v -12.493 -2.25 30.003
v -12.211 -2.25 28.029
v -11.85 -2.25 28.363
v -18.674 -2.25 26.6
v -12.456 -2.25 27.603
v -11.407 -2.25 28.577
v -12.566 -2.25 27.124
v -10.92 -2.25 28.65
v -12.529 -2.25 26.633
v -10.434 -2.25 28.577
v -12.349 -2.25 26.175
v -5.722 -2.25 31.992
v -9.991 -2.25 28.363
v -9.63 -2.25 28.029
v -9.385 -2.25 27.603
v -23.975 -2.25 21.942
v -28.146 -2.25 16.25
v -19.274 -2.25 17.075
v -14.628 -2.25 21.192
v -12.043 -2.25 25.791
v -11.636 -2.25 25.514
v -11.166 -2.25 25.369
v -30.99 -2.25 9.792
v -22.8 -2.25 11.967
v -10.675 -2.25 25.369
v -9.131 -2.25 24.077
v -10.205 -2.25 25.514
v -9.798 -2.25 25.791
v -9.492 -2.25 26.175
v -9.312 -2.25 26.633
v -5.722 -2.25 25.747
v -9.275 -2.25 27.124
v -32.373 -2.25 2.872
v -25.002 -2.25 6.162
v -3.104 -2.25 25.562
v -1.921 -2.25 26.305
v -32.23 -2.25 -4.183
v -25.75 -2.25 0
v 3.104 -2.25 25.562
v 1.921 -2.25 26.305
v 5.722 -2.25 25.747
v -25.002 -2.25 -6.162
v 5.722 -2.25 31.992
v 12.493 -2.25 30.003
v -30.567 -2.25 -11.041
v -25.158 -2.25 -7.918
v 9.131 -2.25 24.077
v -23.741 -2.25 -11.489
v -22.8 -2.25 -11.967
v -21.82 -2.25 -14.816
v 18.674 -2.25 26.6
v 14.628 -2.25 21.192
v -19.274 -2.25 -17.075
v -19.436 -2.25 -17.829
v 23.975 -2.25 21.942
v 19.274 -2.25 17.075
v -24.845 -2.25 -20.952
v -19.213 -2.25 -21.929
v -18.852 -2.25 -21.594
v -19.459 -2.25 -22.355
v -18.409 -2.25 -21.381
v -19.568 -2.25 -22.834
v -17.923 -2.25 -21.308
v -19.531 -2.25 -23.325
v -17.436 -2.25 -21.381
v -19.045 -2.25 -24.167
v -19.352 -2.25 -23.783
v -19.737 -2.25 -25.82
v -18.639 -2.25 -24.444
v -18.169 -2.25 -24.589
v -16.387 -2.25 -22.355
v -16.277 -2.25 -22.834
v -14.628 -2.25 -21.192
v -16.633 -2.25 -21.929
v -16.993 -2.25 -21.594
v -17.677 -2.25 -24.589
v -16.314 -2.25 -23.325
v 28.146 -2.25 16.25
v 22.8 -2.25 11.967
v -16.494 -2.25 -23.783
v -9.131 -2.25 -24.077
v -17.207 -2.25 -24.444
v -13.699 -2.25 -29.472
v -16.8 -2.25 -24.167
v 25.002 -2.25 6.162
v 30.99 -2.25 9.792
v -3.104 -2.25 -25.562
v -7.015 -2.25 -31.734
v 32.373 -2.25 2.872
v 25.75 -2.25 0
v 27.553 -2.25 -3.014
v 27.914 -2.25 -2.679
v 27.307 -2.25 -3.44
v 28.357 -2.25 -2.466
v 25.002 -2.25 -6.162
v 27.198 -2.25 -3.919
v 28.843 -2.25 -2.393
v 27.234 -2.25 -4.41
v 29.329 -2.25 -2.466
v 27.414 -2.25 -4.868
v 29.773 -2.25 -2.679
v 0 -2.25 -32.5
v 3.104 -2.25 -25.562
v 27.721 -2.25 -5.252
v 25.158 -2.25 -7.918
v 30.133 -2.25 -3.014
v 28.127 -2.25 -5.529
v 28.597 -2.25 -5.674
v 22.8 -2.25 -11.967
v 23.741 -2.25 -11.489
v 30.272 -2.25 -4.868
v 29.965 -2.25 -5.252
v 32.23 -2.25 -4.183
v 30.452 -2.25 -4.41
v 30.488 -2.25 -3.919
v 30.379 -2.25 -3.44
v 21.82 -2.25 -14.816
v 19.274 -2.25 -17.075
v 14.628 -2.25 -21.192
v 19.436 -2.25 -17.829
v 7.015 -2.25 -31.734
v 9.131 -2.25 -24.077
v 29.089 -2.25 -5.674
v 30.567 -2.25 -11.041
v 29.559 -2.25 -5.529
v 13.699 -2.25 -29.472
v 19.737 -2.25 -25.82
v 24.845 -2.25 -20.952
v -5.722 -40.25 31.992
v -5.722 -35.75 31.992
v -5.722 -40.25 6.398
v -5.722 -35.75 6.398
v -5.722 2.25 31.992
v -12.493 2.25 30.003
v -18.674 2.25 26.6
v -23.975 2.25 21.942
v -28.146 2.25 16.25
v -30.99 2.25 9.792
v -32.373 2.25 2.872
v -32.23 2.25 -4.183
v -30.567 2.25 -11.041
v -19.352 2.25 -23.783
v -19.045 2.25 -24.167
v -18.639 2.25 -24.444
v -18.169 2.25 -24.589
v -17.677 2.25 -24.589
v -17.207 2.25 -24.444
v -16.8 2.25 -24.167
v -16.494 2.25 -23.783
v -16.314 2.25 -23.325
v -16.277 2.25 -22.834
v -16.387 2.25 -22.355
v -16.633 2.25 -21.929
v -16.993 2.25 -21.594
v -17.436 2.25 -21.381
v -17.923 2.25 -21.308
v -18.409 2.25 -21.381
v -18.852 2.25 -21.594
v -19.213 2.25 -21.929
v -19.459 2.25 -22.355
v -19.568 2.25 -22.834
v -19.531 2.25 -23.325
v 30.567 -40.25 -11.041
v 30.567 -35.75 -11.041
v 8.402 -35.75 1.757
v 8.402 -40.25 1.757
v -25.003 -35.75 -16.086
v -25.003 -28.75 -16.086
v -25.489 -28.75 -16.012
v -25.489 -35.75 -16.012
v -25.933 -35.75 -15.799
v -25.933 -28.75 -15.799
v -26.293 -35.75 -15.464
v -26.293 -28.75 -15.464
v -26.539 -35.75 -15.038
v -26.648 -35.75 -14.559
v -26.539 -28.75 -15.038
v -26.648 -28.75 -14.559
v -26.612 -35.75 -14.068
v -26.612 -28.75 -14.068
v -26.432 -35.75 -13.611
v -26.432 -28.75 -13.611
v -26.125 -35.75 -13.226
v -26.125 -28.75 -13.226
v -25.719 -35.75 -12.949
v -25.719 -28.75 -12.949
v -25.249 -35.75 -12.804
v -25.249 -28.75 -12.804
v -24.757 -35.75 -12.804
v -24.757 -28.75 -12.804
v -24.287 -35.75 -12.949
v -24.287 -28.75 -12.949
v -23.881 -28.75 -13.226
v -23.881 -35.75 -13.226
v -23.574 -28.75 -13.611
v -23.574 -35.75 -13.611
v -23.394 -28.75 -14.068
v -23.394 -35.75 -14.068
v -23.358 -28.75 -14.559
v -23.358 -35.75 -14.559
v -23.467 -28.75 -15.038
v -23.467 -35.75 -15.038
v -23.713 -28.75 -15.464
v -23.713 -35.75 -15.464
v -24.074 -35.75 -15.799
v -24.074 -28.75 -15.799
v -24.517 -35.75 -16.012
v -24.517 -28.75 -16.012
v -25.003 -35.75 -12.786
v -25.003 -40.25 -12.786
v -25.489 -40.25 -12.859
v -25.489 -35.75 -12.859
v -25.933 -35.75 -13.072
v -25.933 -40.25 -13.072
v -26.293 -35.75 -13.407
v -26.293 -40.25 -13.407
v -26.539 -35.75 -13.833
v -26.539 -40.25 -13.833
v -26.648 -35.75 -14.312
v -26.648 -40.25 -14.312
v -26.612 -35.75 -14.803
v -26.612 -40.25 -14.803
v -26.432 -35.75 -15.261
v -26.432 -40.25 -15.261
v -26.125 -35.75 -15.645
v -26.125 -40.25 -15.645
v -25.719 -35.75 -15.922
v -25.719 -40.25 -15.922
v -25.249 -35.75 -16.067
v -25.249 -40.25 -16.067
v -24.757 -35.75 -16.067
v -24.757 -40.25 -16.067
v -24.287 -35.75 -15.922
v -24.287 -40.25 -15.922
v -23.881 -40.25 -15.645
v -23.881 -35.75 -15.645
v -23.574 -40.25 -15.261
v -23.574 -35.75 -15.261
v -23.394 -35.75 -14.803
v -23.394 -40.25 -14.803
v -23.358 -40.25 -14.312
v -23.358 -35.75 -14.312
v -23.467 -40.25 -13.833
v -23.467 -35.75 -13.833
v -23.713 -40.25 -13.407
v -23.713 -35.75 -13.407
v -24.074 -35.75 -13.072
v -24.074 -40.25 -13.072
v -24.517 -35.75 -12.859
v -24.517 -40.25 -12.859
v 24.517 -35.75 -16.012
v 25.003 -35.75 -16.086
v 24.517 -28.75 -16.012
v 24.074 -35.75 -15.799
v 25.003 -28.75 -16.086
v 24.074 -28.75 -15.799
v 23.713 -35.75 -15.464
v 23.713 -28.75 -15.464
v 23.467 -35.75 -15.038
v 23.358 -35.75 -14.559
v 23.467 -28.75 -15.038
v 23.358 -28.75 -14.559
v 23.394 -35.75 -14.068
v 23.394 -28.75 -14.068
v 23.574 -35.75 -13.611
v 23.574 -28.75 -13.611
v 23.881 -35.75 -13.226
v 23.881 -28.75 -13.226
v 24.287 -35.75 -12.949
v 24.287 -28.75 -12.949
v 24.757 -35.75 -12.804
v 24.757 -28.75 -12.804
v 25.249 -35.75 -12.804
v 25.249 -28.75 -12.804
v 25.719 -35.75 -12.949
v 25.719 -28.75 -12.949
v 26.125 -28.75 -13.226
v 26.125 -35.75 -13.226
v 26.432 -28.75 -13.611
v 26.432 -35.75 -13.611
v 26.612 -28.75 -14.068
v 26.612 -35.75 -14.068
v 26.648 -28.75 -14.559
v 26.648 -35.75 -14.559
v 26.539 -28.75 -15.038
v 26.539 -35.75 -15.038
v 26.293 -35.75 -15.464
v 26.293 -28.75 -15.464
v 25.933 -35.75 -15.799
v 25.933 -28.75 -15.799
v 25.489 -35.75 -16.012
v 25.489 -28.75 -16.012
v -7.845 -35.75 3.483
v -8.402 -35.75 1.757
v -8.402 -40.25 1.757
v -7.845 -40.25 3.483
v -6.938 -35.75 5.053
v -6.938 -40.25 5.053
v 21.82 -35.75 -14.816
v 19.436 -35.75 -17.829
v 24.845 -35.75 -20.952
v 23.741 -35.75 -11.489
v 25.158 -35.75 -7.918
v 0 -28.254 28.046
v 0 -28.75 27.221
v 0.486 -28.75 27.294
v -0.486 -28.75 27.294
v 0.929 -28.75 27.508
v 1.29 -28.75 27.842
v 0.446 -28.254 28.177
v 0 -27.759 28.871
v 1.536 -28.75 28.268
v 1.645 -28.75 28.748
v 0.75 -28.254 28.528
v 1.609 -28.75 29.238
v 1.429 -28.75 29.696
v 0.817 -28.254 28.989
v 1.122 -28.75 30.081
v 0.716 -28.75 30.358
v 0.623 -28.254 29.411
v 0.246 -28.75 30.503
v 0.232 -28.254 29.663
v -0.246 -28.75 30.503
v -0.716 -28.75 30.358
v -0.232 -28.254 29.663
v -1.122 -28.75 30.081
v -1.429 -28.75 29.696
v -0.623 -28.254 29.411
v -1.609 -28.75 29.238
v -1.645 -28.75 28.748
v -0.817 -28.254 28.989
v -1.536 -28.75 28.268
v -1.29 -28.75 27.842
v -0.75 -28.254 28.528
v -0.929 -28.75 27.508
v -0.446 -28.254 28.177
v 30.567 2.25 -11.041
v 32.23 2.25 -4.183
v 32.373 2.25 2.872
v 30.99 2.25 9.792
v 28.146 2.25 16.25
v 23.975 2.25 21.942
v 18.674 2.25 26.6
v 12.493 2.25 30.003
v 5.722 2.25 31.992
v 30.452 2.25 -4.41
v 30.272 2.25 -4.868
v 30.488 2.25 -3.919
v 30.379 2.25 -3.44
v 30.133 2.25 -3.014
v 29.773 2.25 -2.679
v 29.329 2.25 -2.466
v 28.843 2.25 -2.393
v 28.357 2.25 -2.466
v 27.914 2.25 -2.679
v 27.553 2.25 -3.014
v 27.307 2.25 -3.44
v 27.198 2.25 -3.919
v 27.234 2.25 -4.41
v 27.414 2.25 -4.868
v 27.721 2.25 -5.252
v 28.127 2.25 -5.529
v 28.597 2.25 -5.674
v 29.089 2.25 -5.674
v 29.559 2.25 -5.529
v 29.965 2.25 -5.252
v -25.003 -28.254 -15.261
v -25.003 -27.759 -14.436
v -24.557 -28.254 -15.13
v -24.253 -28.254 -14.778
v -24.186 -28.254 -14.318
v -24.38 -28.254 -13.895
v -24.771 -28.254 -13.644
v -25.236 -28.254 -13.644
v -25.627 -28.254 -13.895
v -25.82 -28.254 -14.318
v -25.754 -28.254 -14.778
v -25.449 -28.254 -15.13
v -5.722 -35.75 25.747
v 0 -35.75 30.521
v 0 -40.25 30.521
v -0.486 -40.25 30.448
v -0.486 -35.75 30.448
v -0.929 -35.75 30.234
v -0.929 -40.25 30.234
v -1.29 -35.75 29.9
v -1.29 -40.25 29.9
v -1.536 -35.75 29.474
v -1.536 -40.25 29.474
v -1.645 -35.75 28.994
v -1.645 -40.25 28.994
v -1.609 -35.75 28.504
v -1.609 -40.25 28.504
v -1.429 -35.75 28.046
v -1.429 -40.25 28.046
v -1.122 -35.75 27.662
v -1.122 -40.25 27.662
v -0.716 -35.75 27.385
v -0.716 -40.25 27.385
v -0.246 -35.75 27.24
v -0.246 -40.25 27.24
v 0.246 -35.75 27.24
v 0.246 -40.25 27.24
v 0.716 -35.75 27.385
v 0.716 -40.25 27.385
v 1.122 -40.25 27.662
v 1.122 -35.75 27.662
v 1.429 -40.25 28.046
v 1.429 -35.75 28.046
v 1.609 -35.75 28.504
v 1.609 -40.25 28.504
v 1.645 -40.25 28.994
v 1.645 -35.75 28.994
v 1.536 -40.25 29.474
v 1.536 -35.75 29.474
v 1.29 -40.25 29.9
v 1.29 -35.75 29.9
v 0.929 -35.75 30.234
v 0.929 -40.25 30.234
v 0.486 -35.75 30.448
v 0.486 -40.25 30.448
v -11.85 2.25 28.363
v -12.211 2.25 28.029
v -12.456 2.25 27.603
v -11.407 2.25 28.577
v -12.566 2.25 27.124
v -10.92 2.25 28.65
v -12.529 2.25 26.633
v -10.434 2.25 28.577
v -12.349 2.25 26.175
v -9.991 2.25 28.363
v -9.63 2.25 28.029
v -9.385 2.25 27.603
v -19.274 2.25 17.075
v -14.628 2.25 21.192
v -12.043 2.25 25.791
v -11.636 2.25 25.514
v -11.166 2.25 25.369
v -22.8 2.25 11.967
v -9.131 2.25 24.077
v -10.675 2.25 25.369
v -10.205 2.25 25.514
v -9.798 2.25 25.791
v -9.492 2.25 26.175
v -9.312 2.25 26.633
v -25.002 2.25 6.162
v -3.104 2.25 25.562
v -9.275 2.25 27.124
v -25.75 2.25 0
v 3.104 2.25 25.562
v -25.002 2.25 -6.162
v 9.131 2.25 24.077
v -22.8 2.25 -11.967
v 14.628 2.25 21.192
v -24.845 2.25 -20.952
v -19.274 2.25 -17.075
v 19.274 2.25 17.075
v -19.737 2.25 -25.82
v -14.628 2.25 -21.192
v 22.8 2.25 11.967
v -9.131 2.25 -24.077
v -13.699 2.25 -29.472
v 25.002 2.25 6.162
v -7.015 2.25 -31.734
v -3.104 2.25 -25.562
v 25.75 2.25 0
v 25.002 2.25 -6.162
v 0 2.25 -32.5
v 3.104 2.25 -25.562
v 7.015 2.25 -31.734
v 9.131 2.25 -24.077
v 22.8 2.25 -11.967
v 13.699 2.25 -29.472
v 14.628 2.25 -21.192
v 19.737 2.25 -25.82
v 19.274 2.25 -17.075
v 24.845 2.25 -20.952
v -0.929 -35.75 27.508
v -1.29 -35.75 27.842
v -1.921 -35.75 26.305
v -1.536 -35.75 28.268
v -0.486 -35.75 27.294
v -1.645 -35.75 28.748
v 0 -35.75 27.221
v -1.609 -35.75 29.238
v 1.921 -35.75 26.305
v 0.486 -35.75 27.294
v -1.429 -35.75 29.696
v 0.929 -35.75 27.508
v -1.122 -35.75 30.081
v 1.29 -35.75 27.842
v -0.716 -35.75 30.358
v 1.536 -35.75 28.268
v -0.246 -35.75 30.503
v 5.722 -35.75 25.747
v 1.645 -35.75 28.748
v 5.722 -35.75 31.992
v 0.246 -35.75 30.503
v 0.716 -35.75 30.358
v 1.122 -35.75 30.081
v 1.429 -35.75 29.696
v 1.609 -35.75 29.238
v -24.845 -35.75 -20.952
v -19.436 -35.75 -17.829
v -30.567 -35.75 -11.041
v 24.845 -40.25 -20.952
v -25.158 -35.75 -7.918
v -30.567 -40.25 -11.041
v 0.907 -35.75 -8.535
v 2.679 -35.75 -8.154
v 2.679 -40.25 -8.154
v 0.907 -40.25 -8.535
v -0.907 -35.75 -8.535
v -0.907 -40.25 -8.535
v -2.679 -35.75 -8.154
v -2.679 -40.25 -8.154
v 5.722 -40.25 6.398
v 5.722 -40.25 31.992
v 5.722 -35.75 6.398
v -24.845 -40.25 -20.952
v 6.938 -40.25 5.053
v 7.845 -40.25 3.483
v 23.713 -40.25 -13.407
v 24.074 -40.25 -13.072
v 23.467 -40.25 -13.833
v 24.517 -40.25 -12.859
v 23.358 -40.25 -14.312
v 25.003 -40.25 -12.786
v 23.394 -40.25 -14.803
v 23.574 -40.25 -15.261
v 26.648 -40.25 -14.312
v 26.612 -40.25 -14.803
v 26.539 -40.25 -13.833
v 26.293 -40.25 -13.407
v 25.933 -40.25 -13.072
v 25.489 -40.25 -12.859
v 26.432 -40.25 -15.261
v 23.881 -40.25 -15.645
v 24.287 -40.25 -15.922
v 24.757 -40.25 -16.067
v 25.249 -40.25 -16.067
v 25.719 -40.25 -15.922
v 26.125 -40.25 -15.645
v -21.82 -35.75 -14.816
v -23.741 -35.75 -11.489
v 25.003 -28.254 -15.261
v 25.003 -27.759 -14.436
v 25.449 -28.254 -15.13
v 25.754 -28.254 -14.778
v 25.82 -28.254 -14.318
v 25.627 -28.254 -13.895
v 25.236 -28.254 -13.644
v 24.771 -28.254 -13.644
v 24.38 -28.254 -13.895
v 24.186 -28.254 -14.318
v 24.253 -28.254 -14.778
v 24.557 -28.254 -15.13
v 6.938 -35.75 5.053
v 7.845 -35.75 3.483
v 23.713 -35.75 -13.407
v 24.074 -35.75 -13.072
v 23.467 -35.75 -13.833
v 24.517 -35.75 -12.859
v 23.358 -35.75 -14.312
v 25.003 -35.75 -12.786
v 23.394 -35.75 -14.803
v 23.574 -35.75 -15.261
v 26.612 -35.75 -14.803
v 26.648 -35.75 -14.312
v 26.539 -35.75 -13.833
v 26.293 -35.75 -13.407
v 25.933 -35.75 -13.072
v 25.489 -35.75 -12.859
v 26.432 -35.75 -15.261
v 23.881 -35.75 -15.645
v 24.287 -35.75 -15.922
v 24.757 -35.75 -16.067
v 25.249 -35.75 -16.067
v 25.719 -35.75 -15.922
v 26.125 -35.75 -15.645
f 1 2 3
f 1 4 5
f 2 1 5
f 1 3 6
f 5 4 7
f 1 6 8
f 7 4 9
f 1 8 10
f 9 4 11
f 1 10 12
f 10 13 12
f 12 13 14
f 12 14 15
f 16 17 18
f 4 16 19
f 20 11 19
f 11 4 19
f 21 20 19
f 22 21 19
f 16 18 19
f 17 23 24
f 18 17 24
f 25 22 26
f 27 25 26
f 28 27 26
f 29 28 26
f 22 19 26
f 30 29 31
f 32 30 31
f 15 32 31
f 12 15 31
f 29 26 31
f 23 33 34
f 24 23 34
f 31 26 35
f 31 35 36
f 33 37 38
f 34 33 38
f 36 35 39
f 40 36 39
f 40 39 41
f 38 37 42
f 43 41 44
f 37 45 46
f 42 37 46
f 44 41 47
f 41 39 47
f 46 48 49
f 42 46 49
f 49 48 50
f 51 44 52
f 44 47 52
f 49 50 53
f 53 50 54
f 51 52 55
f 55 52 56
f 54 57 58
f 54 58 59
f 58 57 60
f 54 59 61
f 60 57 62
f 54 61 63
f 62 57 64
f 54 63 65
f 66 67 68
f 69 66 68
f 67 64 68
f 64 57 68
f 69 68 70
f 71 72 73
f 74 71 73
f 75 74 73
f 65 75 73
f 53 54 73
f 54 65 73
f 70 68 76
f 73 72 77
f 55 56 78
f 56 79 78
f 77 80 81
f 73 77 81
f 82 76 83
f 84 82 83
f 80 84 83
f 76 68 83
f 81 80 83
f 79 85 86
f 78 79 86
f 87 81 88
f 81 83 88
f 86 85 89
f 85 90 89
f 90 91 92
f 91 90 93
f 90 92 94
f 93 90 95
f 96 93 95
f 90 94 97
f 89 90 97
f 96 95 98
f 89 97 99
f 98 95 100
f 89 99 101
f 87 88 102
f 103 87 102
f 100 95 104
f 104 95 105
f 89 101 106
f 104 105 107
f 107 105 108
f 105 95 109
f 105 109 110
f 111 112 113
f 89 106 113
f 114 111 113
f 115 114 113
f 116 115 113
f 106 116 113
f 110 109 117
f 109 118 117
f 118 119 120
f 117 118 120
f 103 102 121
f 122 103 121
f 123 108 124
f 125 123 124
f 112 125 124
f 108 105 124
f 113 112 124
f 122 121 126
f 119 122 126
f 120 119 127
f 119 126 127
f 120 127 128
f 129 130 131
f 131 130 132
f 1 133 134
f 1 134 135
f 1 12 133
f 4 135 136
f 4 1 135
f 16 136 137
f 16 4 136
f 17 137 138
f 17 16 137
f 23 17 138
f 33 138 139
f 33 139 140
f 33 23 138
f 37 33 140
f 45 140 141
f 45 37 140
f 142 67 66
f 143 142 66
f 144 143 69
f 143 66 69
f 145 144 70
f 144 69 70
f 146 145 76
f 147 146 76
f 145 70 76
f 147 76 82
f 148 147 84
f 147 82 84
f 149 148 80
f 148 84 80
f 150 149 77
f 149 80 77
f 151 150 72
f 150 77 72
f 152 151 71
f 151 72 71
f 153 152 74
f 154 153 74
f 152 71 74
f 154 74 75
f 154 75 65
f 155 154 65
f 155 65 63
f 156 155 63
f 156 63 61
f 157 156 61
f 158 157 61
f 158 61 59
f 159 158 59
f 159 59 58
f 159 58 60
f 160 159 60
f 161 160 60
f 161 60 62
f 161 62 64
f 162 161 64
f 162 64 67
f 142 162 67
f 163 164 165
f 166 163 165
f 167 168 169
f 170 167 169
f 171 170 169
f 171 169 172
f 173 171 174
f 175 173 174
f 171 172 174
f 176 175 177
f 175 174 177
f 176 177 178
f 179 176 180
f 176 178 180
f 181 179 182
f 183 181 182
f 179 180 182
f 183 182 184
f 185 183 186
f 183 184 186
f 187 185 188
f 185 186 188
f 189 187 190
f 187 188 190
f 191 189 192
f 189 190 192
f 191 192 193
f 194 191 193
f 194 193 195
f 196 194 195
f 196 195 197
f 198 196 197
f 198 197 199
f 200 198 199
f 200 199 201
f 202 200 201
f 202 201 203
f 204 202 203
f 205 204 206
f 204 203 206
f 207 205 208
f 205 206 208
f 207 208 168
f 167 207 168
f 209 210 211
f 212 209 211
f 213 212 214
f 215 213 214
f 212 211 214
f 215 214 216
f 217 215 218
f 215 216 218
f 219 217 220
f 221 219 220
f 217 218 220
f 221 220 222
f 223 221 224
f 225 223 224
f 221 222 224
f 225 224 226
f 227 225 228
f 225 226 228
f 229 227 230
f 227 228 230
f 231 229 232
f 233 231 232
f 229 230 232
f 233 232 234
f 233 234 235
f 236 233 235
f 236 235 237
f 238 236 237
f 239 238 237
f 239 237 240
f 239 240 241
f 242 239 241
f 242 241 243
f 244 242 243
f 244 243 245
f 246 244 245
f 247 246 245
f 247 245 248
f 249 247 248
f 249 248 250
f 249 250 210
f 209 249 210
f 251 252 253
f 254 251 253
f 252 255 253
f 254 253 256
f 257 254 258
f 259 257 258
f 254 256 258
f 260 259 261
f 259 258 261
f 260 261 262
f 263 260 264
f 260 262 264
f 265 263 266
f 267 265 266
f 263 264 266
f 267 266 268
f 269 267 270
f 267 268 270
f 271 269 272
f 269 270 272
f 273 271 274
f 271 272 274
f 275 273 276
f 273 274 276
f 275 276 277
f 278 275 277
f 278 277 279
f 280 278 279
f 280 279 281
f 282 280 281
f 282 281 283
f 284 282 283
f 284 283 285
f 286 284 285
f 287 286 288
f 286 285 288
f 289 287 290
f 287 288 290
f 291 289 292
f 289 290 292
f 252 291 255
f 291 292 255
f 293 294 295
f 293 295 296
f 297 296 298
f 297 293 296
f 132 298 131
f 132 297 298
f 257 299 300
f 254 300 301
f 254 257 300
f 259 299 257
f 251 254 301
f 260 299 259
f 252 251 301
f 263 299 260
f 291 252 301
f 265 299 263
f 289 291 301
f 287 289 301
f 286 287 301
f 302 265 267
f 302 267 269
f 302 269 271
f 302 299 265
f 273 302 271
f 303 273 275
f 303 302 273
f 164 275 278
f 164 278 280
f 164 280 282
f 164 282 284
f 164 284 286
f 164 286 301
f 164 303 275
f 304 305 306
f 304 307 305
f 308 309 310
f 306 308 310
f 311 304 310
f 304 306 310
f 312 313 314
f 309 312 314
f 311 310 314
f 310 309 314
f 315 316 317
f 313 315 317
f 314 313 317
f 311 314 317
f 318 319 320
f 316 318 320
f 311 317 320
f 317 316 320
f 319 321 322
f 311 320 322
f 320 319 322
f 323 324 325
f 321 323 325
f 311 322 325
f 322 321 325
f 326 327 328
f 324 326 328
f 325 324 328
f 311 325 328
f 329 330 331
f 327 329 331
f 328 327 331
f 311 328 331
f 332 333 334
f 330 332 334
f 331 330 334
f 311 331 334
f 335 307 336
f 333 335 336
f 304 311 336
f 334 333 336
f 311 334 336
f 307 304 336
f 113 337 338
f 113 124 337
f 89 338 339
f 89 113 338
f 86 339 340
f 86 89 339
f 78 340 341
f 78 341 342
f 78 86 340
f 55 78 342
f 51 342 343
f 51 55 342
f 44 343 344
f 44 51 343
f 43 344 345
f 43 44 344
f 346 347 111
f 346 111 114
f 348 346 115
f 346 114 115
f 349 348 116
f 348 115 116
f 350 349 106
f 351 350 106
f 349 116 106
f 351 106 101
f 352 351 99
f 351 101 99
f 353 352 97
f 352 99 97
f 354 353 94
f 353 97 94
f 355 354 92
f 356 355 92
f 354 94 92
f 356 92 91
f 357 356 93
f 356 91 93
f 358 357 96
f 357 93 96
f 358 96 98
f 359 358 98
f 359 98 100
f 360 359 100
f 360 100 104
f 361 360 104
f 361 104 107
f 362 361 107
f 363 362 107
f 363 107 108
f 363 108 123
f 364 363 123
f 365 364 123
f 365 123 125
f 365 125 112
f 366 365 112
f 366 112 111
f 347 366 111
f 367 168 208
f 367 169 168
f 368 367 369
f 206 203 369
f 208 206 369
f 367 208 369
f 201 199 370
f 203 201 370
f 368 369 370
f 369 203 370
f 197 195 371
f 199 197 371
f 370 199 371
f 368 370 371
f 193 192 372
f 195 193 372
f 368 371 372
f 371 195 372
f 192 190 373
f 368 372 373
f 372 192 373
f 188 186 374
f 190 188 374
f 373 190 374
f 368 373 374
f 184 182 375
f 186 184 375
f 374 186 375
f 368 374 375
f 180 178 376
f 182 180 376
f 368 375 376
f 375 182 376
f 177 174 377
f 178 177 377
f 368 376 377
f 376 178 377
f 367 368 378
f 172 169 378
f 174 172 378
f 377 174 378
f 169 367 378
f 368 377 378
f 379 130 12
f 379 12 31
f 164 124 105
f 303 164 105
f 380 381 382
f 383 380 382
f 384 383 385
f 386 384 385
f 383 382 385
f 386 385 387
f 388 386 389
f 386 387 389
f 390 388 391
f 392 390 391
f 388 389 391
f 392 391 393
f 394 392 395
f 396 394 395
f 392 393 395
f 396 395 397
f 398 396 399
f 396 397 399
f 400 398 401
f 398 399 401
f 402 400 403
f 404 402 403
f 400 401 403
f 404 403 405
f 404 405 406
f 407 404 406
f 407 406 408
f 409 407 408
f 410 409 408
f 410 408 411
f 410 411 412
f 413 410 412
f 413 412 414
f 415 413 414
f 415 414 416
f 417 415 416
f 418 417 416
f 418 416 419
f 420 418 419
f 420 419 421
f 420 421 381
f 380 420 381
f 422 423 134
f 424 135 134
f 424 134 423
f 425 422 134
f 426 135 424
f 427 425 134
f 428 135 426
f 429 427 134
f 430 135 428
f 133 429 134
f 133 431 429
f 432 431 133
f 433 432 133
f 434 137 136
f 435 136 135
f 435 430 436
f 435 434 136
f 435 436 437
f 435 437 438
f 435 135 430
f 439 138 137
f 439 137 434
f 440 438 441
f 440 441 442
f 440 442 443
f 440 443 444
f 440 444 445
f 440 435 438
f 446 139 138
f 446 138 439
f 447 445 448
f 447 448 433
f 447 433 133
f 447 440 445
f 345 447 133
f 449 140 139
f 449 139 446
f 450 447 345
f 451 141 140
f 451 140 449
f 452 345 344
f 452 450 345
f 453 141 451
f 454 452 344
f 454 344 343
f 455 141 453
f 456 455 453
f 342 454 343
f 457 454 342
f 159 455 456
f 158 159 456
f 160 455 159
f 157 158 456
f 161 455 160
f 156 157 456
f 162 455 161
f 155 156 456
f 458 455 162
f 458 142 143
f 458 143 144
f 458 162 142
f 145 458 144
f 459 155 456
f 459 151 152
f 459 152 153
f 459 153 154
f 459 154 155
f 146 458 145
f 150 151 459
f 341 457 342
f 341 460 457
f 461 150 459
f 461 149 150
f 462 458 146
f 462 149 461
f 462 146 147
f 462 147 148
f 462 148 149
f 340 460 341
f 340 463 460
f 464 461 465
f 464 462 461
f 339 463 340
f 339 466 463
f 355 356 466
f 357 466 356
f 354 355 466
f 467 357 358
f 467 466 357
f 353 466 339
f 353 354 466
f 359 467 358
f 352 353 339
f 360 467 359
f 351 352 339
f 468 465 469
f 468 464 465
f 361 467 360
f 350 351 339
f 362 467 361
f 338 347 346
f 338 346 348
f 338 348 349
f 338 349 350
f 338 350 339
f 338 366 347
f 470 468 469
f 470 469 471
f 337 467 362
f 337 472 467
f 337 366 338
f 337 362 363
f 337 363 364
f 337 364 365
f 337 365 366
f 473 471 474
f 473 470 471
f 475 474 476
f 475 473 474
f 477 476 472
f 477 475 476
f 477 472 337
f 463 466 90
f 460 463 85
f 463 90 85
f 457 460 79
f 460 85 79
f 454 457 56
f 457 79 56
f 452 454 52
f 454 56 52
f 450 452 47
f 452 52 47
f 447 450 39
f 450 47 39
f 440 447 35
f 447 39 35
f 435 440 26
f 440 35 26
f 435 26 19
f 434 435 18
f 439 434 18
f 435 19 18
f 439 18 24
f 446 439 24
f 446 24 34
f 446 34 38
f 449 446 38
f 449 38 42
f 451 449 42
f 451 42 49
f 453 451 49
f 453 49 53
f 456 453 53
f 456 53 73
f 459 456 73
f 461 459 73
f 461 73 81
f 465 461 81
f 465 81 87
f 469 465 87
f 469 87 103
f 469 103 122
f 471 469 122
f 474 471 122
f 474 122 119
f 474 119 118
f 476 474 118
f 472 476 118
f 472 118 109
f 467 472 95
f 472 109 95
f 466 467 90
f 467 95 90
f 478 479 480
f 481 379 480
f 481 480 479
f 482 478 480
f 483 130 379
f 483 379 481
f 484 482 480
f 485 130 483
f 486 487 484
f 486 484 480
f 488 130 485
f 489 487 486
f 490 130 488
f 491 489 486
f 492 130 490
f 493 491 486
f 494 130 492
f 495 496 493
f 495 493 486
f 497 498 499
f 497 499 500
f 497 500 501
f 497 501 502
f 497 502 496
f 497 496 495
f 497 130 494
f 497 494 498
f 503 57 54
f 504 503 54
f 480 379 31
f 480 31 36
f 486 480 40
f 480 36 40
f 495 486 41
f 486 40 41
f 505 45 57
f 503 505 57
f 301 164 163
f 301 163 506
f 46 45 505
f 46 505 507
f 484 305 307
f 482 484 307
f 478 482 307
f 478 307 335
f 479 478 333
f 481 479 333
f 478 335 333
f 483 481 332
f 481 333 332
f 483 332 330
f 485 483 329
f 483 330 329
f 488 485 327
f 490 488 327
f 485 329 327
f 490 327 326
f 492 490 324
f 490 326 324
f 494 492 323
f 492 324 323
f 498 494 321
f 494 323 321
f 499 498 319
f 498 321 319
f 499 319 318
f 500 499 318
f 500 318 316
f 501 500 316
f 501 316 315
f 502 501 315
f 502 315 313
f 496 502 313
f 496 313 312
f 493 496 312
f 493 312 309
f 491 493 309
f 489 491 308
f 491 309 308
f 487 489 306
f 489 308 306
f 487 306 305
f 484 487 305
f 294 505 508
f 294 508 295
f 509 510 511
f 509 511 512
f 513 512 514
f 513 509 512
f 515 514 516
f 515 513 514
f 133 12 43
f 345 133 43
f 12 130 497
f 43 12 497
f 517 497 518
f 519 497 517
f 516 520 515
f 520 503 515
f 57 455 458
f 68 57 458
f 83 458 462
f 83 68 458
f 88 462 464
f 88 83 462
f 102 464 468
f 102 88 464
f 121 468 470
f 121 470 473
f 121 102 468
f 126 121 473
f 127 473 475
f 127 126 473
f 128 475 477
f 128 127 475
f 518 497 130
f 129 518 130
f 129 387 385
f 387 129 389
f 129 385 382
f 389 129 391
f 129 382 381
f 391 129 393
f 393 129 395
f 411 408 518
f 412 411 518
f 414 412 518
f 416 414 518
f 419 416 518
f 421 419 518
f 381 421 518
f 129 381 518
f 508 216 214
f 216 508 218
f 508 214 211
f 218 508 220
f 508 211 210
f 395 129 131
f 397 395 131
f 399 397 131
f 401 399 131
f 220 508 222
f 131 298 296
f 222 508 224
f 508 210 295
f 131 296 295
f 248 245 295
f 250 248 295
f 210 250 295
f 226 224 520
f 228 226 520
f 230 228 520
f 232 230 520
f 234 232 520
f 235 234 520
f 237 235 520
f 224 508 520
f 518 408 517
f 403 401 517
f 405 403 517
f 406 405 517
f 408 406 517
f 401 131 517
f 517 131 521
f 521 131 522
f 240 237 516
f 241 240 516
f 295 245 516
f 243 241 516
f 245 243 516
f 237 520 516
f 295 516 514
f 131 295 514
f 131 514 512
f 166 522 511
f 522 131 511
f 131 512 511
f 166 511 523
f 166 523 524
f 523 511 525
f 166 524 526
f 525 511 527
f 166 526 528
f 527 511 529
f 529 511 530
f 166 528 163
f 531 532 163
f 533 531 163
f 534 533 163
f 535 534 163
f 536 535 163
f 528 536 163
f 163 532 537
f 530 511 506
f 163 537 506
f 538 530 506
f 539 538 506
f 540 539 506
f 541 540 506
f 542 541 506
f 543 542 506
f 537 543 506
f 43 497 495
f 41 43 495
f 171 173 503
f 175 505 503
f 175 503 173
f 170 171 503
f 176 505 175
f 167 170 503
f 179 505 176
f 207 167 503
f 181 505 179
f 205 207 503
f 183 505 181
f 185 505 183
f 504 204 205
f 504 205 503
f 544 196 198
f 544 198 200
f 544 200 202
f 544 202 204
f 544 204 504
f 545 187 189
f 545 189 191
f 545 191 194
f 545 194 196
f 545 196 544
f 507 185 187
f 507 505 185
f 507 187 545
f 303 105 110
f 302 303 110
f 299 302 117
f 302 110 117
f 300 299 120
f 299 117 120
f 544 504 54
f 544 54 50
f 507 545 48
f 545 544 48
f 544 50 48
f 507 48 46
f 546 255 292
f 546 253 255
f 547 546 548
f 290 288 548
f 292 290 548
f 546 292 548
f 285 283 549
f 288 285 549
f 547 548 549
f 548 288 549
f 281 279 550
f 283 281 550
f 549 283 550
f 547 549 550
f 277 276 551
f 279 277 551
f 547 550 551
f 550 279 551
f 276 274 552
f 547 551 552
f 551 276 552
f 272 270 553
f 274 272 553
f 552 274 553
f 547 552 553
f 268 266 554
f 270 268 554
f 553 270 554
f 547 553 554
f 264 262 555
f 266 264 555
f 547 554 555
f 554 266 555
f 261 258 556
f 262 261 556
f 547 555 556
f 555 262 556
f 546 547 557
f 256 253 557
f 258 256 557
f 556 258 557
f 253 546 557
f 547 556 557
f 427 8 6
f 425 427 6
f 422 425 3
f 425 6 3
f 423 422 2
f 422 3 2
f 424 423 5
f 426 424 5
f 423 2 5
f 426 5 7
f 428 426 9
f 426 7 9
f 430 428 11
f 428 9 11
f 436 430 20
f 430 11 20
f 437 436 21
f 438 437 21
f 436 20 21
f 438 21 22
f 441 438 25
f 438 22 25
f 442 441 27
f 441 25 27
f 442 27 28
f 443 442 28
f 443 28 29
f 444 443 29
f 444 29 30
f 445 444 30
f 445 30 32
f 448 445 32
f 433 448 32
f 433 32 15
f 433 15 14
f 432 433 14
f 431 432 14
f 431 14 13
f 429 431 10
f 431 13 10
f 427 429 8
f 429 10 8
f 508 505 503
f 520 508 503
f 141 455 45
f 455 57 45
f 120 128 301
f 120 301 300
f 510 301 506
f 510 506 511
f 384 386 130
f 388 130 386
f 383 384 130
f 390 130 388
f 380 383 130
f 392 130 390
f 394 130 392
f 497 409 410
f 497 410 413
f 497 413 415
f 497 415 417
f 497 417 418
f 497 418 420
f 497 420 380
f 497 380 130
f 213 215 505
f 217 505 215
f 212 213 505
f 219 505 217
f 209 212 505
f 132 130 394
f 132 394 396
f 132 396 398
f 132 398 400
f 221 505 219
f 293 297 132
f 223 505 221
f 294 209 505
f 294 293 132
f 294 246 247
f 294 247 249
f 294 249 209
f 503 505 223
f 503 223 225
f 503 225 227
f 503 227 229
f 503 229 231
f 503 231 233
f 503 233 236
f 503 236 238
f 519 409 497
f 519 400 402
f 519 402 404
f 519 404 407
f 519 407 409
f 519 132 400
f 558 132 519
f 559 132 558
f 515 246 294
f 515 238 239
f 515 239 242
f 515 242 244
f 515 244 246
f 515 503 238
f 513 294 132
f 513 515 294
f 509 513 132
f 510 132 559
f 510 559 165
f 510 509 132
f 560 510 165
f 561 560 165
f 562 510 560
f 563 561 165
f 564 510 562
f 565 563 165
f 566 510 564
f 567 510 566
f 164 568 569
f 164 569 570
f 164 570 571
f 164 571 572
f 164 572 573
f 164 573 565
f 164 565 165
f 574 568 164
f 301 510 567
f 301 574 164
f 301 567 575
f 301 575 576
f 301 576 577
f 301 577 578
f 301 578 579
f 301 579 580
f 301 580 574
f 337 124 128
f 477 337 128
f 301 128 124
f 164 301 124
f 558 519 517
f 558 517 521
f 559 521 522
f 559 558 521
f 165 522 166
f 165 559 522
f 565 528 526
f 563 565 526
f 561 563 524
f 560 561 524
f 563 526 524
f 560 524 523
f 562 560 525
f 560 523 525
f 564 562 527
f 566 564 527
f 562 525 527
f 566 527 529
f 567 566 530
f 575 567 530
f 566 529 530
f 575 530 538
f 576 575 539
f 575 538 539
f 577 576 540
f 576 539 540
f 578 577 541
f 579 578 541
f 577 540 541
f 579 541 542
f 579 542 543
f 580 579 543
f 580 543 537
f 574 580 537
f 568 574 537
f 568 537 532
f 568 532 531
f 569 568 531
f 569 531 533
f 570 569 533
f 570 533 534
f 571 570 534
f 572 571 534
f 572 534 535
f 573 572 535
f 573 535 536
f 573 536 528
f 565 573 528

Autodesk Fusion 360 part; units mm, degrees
sketch "Sketch1" plane through (0, 0, 0) normal (0, 1, 0) x (1, 0, 0)
  circle A0 centre (0, 0) radius 25.75
  line L0 (0, 0) -> (0, -25.75) construction
  line L1 (0, -30.75) -> (0, -25.75) construction
  line L2 (5.7222, -25.75) -> (-5.7222, -25.75)
  line L3 (-5.7222, -25.75) -> (-5.7222, -31.9923)
  line L4 (-5.7222, -31.9923) -> (5.7222, -31.9923)
  line L5 (5.7222, -31.9923) -> (5.7222, -25.75)
  circle A1 centre (0, 0) radius 32.5
  dimension "d1" = 51.5
  dimension "d62" = 11.4444
  dimension "d83" = 65
extrude "Extrude1" add sketch "Sketch1" along normal mid plane 4.5 makes body 1
extrude "Extrude6" cut sketch "Sketch1" along normal up to surface (2.25 mm away) and the other way up to surface (2.25 mm away) contours L4 A1 bodies 1
pattern_circular "C-Pattern2" count 3 over 360 about axis through (0, 1.75, 0) along (0, 1, 0) of "Extrude6"
ref_plane "WorkPlane1" through (0, 2.25, 0) normal (0, 1, 0) x (1, 0, 0)
sketch "Sketch10" plane through (0, -2.25, 0) normal (0, -1, 0) x (1, 0, 0)
  line L0 (-30.5672, -11.0406) -> (-24.845, -20.9517)
  arc A0 (-24.845, -20.9517) -> (24.845, -20.9517) centre (0, 0) ccw
  line L1 (24.845, -20.9517) -> (30.5672, -11.0406)
  arc A1 (30.5672, -11.0406) -> (5.7222, 31.9923) centre (0, 0) ccw
  line L2 (5.7222, 31.9923) -> (-5.7222, 31.9923)
  arc A2 (-5.7222, 31.9923) -> (-30.5672, -11.0406) centre (0, 0) ccw
  circle A3 centre (0, 0) radius 25.75
  line L3 (-5.7222, 31.9923) -> (-5.7222, 25.7468)
  line L4 (5.7222, 31.9923) -> (5.7222, 25.7468)
  line L5 (-24.845, -20.9517) -> (-19.4363, -17.829)
  line L6 (-30.5672, -11.0406) -> (-25.1585, -7.9178)
  line L7 (-30.5672, -11.0406) -> (-24.845, -20.9517)
  line L8 (30.5672, -11.0406) -> (25.1585, -7.9178)
  line L9 (24.845, -20.9517) -> (19.4363, -17.829)
  line L10 (24.845, -20.9517) -> (30.5672, -11.0406)
  circle A4 centre (0, 0) radius 26.375
  dimension "d90" = 360
  dimension "d91" = 52.75
extrude "Extrude2" add sketch "Sketch10" along normal blind 33.5 contours L0 L5 L6 L7 A4 | L2 L3 L4 A4 | L1 L8 L9 L10 A4 bodies 1
sketch "Sketch3" plane through (0, -35.75, 0) normal (0, 1, 0) x (1, 0, 0)
  line L0 (0, -1.75) -> (0, -22.5)
  line L1 (-5.7222, -31.9923) -> (-5.7222, -6.3976)
  line L2 (5.7222, -31.9923) -> (5.7222, -6.3976)
  circle A0 centre (0, 0) radius 32.5
  line L3 (24.845, 20.9517) -> (2.6794, 8.1544)
  line L4 (30.5672, 11.0406) -> (8.4016, -1.7568)
  line L5 (-30.5672, 11.0406) -> (-8.4016, -1.7568)
  line L6 (-24.845, 20.9517) -> (-2.6794, 8.1544)
  circle A1 centre (0, 0) radius 8.5833
  line L7 (30.5672, 11.0406) -> (24.845, 20.9517)
  line L8 (24.845, 20.9517) -> (24.3966, 21.7285)
  line L9 (24.3966, 21.7285) -> (30.6869, 10.8333)
  line L10 (30.6869, 10.8333) -> (30.5672, 11.0406)
  line L11 (-24.7254, 21.159) -> (-24.845, 20.9517)
  line L12 (-31.0157, 10.2638) -> (-24.7254, 21.159)
  line L13 (-30.5672, 11.0406) -> (-31.0157, 10.2638)
  line L14 (-5.9616, -31.9923) -> (-5.7222, -31.9923)
  line L15 (6.6191, -31.9923) -> (-5.9616, -31.9923)
  line L16 (5.7222, -31.9923) -> (6.6191, -31.9923)
  arc A2 (24.8108, 6.8911) -> (18.3733, 18.0412) centre (0, 0) ccw
  line L17 (-25.1585, 7.9178) -> (-30.5672, 11.0406)
  line L18 (-30.5672, 11.0406) -> (-24.845, 20.9517)
  line L19 (-24.845, 20.9517) -> (-19.4363, 17.829)
  line L20 (27.7061, 15.9961) -> (22.3002, 12.875) construction
  arc A3 (-19.4363, 17.829) -> (-25.1585, 7.9178) centre (0, 0) ccw
  point P0 (25.0031, 14.4356)
  point P1 (-25.0031, 14.4356)
  point P2 (0, -28.8711)
  dimension "d21" = 5.7222
  dimension "d22" = 65
  dimension "d24" = 360
  dimension "d26" = 17.1667
  dimension "d44" = 360
  dimension "d55" = 360
extrude "Extrude3" add sketch "Sketch3" against normal blind 4.5 separate body contours L1 L2 A1 L15 | A1 | L5 L6 L12 L17 L18 L19 A3 | L5 L6 A1 A3 | L3 L4 L7 L9 A2 | L3 L4 A1 A2 makes body 2
hole "Hole1" at (25.0031, -35.75, -14.4356) at (-25.0031, -35.75, -14.4356) at (0, -35.75, 28.8711) direction (0, -1, 0) diameter 3.3 end up to surface (4.5 mm away) bodies 2
hole "Hole5" at (-25.0031, -35.75, -14.4356) at (0, -35.75, 28.8711) at (25.0031, -35.75, -14.4356) direction (0, 1, 0) diameter 3.3 depth 7 tip angle 118 bodies 1
sketch "Sketch9" plane through (0, 2.25, 0) normal (0, 1, 0) x (1, 0, 0)
  arc A0 (-30.5672, 11.0406) -> (-5.7222, -31.9923) centre (0, 0) ccw
  arc A1 (5.7222, -6.3976) -> (8.4016, -1.7568) centre (0, 0) ccw
  line L0 (5.7222, -31.9923) -> (5.7222, -6.3976)
  line L1 (-5.7222, -31.9923) -> (5.7222, -31.9923)
  line L2 (-5.7222, -6.3976) -> (-5.7222, -31.9923)
  arc A2 (-8.4016, -1.7568) -> (-5.7222, -6.3976) centre (0, 0) ccw
  line L3 (-30.5672, 11.0406) -> (-8.4016, -1.7568)
  line L4 (-24.845, 20.9517) -> (-30.5672, 11.0406)
  line L5 (-2.6794, 8.1544) -> (-24.845, 20.9517)
  arc A3 (2.6794, 8.1544) -> (-2.6794, 8.1544) centre (0, 0) ccw
  line L6 (24.845, 20.9517) -> (2.6794, 8.1544)
  line L7 (30.5672, 11.0406) -> (24.845, 20.9517)
  line L8 (8.4016, -1.7568) -> (30.5672, 11.0406)
  line L9 (0, 0) -> (-10.9205, -27.0002) construction
  line L10 (-24.845, 20.9517) -> (-30.5672, 11.0406)
  line L11 (-5.7222, -31.9923) -> (5.7222, -31.9923)
  line L12 (30.5672, 11.0406) -> (24.845, 20.9517)
  circle A4 centre (0, 0) radius 25.75
  arc A5 (5.7222, -31.9923) -> (30.5672, 11.0406) centre (0, 0) ccw
  arc A6 (24.845, 20.9517) -> (-24.845, 20.9517) centre (0, 0) ccw
  circle A7 centre (-25.0031, 14.4356) radius 1.65
  circle A8 centre (25.0031, 14.4356) radius 1.65
  circle A9 centre (0, -28.8711) radius 1.65
  line L13 (-9.655, -23.8714) -> (-12.186, -30.1289) construction
hole "Hole6" at (-10.9205, 2.25, 27.0002) direction (0, -1, 0) diameter 3.3 end up to surface (4.5 mm away) bodies 1
pattern_circular "C-Pattern4" count 3 over 360 about axis through (0, 1.75, 0) along (0, 1, 0) of "Hole6"
equation "d1 = InsideCircle"
equation "d3 = MiddleHeight"
equation "OutsideCircle = 65 mm"
equation "InsideCircle = 51.5 mm"
equation "ColumnWidth = InsideCircle / 4.5"
equation "d14 = Height - MiddleHeight + 8 mm"
equation "d21 = ColumnWidth / 2"
equation "d22 = OutsideCircle"
equation "d26 = InsideCircle / 3"
equation "MountHeights = 4.5 mm"
equation "InsertA = 3.5 mm"
equation "d56 = InsertA - 0.2 mm"
equation "d62 = ColumnWidth"
equation "SpeakerNonGrillHeight = 36 mm"
equation "MiddleHeight = 4.5 mm"
equation "d83 = OutsideCircle"
equation "Height = 30 mm"
equation "SpeakerD = 52.5 mm"
equation "d91 = SpeakerD + 0.25 mm"
equation "d93 = InsertA - 0.2 mm"
